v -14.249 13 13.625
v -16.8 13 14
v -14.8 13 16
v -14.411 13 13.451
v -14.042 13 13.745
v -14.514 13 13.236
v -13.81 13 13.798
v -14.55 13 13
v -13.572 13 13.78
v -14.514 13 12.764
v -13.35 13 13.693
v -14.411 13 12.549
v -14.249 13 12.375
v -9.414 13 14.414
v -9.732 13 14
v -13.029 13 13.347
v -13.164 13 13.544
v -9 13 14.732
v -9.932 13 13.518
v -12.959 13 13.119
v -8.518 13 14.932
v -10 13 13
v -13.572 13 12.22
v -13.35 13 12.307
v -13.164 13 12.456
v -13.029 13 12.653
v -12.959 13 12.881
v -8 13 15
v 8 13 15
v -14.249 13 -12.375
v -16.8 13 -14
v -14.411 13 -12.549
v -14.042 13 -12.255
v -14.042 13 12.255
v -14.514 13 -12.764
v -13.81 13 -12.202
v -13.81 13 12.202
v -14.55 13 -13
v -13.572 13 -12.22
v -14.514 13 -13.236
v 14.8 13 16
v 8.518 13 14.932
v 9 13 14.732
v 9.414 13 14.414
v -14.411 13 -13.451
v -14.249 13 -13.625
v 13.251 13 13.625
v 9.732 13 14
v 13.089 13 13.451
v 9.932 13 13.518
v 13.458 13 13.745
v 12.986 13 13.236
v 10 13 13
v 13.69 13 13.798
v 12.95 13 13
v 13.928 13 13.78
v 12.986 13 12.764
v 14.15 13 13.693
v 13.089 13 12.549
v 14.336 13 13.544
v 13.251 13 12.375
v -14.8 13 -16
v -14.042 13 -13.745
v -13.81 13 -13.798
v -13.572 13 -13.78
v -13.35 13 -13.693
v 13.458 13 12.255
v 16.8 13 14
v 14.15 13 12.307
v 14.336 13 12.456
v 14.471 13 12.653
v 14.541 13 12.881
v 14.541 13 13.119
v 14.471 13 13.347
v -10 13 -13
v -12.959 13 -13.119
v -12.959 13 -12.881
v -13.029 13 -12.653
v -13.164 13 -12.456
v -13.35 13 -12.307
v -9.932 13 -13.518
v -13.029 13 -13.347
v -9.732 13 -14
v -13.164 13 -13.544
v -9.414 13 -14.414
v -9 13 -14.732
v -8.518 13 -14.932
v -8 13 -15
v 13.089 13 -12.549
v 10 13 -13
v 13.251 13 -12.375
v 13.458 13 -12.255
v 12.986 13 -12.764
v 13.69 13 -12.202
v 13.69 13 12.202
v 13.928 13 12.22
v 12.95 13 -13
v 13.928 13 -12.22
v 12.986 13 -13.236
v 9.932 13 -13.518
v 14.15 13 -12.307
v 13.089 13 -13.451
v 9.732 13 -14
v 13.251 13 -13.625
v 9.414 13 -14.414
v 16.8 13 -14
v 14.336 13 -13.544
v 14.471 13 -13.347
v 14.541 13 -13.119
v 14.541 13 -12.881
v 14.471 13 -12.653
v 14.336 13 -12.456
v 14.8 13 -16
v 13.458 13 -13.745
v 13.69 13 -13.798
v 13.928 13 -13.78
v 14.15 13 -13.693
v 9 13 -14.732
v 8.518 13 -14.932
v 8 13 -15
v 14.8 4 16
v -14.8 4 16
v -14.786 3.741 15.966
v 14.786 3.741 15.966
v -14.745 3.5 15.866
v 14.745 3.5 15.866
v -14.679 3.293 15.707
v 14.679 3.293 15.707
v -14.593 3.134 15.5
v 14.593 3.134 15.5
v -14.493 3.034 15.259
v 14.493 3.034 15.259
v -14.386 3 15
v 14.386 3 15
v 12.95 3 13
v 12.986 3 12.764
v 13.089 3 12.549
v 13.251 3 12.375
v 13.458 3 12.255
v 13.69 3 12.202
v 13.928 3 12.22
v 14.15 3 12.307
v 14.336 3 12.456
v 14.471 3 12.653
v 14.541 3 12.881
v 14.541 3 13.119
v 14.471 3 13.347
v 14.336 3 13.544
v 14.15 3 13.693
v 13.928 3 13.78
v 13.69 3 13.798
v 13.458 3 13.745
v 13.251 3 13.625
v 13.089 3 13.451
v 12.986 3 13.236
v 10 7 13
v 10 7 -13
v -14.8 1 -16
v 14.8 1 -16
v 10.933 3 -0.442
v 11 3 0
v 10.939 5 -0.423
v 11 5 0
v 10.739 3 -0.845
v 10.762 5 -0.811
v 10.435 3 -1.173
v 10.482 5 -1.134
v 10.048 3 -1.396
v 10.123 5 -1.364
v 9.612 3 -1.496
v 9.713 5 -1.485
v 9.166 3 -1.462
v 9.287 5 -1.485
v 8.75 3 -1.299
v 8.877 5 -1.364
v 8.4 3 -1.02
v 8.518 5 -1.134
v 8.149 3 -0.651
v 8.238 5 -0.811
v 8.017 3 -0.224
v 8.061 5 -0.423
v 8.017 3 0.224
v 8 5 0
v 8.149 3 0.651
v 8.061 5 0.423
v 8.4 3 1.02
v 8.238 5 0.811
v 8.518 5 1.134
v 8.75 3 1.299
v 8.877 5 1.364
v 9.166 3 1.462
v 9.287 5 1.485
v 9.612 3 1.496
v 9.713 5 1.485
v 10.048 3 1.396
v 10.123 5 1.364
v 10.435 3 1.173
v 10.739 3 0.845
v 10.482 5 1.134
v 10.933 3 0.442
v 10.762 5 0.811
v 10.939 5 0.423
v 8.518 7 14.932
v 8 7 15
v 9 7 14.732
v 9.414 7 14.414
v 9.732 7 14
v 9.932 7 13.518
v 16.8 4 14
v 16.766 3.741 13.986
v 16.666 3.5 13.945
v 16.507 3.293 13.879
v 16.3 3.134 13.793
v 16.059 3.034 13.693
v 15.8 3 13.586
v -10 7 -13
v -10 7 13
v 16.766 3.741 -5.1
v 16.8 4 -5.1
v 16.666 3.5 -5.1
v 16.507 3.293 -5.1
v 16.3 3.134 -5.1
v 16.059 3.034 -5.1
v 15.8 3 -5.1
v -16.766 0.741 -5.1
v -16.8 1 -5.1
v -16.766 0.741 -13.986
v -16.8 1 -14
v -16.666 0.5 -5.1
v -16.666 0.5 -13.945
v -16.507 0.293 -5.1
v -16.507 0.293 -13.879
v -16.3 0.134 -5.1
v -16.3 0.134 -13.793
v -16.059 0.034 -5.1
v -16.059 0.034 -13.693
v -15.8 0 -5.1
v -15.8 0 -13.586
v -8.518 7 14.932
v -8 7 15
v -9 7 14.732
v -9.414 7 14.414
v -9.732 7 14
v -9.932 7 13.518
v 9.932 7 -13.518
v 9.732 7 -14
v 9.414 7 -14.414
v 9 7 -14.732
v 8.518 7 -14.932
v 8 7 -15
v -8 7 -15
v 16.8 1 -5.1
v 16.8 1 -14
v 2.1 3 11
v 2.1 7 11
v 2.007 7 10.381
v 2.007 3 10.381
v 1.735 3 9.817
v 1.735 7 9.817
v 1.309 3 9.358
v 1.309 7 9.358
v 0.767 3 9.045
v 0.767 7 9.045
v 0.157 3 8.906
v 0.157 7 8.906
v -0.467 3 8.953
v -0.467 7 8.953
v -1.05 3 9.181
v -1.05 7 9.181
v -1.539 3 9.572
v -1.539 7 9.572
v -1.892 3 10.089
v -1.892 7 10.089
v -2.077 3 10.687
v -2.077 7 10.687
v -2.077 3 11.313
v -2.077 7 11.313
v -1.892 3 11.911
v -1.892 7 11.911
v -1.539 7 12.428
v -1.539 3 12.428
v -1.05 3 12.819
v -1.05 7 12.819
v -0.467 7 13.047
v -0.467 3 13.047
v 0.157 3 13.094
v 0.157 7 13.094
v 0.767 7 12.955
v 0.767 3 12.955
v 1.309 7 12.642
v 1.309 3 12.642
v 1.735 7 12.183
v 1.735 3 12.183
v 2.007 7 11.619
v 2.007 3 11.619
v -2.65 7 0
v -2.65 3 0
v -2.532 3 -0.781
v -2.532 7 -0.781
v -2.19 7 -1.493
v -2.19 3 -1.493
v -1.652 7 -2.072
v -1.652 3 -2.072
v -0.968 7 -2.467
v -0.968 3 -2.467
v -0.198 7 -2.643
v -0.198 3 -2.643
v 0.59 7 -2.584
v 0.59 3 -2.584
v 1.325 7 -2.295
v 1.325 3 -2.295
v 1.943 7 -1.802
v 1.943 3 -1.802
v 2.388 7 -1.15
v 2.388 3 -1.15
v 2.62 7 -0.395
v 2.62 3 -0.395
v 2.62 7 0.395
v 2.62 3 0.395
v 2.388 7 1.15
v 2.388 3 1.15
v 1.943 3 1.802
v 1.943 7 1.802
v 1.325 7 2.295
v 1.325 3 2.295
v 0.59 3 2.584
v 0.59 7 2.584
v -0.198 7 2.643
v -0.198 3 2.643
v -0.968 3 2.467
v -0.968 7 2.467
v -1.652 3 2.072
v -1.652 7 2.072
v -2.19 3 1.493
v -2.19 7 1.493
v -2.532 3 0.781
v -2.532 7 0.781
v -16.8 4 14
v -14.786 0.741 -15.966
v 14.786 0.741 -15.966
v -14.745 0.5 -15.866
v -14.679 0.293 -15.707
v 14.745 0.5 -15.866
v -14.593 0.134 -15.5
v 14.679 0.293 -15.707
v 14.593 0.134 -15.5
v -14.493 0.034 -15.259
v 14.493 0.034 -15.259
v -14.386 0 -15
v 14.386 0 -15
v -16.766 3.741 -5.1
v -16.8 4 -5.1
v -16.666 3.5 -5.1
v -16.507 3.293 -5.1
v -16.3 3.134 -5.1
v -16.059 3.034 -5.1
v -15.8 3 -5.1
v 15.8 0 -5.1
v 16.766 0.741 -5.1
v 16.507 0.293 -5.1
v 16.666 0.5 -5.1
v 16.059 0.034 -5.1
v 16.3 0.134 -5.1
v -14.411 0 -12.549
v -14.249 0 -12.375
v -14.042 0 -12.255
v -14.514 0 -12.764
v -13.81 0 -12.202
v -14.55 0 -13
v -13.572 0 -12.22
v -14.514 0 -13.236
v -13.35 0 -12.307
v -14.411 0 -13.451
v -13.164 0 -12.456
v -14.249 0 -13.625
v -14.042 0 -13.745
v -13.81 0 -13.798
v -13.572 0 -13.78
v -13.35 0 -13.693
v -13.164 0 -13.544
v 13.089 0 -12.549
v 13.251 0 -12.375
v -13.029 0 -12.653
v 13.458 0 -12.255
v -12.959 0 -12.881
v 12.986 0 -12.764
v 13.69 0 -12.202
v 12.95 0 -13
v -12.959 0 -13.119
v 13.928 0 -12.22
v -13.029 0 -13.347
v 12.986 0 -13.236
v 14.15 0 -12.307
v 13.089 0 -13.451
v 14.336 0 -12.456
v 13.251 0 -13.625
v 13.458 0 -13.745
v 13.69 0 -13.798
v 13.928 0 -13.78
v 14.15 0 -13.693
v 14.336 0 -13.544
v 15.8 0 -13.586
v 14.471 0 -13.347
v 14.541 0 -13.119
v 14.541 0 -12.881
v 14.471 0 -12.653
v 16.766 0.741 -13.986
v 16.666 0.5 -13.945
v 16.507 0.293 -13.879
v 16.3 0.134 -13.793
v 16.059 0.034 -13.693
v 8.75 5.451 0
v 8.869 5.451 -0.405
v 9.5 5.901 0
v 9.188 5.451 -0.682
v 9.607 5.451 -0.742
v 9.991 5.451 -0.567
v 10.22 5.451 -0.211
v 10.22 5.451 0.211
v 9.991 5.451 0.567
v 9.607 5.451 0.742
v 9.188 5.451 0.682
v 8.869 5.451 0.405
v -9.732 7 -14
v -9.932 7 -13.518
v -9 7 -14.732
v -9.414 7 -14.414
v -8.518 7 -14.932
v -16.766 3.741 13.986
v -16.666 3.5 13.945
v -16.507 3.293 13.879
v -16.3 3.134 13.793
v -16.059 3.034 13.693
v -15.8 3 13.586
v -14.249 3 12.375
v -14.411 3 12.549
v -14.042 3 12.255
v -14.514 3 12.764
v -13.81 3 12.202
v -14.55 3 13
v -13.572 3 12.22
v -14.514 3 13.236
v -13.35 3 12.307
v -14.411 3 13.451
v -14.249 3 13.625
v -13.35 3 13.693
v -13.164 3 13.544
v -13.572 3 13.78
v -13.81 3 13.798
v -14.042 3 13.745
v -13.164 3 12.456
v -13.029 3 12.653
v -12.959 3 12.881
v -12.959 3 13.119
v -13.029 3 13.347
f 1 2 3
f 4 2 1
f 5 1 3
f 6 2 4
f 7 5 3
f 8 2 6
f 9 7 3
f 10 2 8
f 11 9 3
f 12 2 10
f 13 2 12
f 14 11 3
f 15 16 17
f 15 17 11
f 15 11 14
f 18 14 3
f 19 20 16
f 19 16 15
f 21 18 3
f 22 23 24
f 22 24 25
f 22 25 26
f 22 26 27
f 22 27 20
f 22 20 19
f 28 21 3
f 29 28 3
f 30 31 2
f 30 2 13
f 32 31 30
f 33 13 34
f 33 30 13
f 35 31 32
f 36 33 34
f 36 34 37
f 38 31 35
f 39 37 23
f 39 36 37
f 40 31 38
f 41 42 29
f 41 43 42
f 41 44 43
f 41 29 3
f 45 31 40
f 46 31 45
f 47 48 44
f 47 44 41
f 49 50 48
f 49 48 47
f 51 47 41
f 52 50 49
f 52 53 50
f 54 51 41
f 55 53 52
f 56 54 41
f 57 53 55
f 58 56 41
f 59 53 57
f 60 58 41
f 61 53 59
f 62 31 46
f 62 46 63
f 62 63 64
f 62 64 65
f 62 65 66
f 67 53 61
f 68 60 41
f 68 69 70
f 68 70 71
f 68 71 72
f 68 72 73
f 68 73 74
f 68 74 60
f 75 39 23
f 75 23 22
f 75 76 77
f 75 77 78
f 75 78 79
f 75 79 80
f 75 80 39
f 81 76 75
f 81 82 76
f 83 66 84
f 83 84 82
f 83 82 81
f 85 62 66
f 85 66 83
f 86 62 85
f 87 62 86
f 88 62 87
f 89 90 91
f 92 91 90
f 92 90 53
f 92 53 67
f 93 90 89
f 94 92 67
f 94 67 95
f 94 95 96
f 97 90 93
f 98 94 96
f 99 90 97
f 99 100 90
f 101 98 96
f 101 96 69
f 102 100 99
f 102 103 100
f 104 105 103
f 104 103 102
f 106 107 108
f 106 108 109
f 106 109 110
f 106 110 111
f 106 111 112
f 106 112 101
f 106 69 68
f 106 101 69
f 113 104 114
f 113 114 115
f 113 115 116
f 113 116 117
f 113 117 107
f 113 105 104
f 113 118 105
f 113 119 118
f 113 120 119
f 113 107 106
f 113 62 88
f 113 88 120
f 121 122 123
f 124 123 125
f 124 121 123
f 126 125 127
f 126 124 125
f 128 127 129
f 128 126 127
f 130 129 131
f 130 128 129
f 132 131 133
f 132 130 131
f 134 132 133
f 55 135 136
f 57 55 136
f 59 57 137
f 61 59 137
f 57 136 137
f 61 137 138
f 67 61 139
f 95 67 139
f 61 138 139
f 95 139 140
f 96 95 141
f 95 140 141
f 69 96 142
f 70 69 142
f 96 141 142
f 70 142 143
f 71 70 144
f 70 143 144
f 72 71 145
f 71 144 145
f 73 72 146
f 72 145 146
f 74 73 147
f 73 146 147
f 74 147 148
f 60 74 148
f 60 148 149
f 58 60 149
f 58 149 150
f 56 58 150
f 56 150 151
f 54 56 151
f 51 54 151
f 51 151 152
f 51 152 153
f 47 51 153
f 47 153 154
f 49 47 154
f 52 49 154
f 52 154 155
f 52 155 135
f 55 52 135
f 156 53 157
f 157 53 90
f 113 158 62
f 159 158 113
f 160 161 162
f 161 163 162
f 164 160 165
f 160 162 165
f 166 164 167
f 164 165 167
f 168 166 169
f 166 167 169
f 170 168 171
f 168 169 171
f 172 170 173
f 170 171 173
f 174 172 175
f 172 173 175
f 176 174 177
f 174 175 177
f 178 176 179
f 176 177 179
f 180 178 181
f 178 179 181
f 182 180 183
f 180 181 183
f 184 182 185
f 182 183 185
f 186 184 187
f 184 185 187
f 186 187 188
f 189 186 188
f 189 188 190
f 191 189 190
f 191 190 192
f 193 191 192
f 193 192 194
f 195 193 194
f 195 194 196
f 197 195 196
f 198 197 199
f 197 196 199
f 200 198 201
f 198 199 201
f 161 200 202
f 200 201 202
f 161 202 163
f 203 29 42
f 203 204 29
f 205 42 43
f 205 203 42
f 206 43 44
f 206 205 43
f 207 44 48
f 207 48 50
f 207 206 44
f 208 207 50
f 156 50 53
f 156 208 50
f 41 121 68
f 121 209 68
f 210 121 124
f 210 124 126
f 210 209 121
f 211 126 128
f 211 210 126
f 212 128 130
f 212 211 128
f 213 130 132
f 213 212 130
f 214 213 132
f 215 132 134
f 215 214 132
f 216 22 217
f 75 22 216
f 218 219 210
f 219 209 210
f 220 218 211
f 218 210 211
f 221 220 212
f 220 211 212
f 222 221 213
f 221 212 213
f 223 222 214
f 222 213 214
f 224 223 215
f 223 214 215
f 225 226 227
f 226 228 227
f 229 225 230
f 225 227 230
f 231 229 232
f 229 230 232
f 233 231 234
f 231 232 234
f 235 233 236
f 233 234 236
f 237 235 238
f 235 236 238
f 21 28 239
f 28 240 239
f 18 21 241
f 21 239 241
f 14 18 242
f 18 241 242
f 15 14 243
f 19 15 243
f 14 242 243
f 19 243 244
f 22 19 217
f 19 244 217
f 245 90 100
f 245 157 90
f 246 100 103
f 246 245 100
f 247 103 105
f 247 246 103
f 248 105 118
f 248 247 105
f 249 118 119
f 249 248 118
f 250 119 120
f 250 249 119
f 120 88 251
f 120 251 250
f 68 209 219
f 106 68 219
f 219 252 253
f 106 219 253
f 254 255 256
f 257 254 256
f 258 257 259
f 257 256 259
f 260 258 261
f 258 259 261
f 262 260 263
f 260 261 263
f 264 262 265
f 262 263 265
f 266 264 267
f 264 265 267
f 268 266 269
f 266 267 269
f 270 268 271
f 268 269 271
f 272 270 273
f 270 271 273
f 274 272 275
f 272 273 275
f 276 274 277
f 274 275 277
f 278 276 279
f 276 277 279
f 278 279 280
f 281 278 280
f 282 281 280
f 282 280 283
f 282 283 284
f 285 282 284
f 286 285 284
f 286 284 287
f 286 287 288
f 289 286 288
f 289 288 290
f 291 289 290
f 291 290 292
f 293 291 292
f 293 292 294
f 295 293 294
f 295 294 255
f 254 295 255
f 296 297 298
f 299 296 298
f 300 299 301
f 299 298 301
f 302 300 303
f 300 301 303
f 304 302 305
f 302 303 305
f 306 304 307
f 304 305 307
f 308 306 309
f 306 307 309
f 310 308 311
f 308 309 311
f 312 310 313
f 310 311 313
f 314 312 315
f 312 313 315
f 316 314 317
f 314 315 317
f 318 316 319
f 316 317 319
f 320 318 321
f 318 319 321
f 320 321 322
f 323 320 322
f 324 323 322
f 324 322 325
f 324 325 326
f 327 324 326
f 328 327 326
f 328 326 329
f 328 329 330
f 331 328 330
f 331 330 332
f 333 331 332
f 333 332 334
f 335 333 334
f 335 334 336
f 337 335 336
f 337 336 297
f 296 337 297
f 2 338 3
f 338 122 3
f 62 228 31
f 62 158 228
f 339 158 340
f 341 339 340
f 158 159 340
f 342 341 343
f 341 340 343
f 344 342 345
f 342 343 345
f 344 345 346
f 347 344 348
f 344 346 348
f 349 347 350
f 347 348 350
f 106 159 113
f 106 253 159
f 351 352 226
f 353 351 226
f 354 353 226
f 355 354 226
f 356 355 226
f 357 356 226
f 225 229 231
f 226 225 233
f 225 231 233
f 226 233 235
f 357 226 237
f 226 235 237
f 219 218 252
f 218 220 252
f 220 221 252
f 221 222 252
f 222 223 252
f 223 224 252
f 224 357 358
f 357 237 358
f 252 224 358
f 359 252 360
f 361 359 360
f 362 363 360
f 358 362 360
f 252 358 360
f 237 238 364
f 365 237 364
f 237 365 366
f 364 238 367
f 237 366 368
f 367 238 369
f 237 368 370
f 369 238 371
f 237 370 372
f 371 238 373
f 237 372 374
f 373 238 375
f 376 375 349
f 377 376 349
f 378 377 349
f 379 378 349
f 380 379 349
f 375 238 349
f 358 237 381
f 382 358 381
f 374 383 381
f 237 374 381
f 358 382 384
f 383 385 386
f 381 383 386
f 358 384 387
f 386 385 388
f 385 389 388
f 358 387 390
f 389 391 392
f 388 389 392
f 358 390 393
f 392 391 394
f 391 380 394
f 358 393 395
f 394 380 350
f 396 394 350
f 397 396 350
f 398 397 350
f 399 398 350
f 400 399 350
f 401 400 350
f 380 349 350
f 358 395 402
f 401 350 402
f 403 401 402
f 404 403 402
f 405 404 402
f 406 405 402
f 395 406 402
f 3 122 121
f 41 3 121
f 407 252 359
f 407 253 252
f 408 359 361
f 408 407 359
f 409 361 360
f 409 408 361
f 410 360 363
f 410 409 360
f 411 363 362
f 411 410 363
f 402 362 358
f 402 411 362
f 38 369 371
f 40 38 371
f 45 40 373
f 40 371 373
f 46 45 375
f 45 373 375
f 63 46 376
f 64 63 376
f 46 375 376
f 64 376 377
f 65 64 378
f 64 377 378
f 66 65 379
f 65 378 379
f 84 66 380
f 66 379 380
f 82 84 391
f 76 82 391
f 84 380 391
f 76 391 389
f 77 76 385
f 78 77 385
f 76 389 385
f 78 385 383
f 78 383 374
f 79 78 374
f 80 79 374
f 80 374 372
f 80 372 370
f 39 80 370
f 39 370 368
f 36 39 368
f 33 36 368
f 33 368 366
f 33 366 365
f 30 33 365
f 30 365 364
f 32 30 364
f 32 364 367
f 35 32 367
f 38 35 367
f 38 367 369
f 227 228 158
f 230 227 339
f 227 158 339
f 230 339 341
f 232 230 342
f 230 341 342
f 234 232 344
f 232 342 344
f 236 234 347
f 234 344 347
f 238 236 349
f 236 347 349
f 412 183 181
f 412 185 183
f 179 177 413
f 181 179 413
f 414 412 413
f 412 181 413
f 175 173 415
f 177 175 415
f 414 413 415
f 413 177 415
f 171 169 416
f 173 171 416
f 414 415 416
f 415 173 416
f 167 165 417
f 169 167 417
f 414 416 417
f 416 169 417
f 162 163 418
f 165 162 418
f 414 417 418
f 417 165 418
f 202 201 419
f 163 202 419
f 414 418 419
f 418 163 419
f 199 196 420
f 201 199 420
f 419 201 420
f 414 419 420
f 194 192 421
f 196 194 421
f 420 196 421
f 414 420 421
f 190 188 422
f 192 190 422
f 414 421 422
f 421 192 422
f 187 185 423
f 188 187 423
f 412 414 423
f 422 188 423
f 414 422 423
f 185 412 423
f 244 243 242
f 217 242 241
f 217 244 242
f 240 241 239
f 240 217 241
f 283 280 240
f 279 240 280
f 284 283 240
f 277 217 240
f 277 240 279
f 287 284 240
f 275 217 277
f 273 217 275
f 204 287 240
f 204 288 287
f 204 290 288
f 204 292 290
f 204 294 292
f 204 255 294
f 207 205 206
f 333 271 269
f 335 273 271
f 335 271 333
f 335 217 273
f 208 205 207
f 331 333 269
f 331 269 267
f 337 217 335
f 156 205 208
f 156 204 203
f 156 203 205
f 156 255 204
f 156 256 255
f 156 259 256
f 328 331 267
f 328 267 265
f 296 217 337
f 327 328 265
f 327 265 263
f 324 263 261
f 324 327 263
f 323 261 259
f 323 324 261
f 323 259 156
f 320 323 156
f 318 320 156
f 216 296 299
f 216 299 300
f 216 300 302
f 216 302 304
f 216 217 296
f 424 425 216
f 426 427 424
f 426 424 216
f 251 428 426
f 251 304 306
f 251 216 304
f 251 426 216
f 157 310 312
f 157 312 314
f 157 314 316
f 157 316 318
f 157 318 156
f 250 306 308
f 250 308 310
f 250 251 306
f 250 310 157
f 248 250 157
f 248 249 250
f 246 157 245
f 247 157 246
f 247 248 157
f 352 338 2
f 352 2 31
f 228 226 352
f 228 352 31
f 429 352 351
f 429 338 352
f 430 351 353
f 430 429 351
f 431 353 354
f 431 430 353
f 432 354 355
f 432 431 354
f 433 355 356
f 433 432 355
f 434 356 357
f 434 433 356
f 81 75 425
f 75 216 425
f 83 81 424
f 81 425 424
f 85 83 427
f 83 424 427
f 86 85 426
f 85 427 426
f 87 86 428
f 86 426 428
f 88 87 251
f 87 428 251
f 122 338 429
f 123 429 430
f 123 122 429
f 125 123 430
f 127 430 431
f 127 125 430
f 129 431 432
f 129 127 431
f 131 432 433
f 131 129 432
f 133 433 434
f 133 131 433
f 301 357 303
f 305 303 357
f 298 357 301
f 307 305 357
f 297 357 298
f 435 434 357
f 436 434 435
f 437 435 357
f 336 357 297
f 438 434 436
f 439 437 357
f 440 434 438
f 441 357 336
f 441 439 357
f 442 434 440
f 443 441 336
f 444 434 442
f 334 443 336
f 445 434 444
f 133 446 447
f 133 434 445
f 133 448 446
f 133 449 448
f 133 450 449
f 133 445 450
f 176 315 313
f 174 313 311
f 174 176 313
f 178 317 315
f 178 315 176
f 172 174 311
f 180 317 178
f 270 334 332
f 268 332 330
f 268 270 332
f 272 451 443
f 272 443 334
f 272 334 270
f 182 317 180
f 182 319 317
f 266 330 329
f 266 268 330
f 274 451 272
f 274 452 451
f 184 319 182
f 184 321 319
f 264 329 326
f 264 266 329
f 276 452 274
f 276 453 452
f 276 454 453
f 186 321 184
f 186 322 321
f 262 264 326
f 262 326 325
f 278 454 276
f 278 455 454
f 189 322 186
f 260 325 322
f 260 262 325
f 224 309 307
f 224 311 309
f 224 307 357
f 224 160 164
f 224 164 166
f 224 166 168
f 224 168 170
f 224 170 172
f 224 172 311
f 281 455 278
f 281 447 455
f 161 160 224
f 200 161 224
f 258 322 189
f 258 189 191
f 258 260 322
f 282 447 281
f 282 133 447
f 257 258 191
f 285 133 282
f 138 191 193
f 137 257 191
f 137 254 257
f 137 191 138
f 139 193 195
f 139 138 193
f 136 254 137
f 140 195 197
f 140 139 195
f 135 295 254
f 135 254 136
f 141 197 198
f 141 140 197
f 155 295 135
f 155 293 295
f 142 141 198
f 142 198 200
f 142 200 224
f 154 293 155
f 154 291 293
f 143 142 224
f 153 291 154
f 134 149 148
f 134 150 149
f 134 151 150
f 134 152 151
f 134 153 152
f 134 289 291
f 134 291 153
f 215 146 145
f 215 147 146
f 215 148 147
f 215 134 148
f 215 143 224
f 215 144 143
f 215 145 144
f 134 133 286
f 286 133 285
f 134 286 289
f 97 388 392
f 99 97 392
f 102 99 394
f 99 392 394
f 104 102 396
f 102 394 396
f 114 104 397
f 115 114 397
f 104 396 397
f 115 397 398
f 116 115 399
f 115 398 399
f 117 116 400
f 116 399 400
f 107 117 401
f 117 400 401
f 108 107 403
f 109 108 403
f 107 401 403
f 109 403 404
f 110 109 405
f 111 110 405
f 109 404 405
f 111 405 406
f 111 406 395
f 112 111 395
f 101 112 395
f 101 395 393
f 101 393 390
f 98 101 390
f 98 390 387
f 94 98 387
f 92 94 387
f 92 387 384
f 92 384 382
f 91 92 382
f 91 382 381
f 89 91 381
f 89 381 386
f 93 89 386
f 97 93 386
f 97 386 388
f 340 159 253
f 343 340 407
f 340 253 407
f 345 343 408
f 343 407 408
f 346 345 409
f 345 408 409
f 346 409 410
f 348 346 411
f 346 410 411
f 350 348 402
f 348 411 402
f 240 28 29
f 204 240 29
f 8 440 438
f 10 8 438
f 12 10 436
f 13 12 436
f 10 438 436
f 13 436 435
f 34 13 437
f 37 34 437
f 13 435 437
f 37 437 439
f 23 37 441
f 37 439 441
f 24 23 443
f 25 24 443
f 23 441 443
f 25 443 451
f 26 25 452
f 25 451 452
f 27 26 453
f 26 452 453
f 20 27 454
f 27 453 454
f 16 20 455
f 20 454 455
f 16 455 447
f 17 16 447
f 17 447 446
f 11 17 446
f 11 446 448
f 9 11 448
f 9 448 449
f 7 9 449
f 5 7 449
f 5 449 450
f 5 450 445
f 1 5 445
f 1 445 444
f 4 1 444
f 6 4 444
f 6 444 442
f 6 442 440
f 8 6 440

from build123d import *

# Parameters (mm, degrees)
SKIZZE1_W                          = 33.6
SKIZZE1_H                          = 32
AUFSATZ_LINEAR_AUSTRAGEN1_DEPTH    = 13
SKIZZE17_W                         = 20
SKIZZE17_H                         = 30
SCHNITT_LINEAR_AUSTRAGEN2_DEPTH    = 6
KERNLOCH_F_R_M2_GEWINDE1_D         = 1.6
VERRUNDUNG2_R                      = 2
DURCHGANGSLOCH_F_R_M52_D           = 5.3
F_3_0MM_CLEARANCE_STIFTLOCH1_D     = 3
F_3_0MM_CLEARANCE_STIFTLOCH1_DEPTH = 5
F_3_0MM_CLEARANCE_STIFTLOCH1_TIP   = 0.901290929
KERNLOCH_F_R_M5_GEWINDE1_D         = 4.2
SKIZZE27_W                         = 33.6
SKIZZE27_H                         = 21.1
SCHNITT_LINEAR_AUSTRAGEN3_DEPTH    = 3
FASE1_SIZE                         = 2
VERRUNDUNG3_R                      = 1


with BuildPart() as part:
    # Skizze1 → Aufsatz-Linear austragen1 (new body)
    with BuildSketch(Plane(origin=(0, 0, 0), x_dir=(1, 0, 0), z_dir=(0, 1, 0))):
        Rectangle(SKIZZE1_W, SKIZZE1_H)
    extrude(amount=AUFSATZ_LINEAR_AUSTRAGEN1_DEPTH)

    # Skizze17 → Schnitt-Linear austragen2 (cut)
    with BuildSketch(Plane(origin=(0, 13, 0), x_dir=(1, 0, 0), z_dir=(0, 1, 0))):
        Rectangle(SKIZZE17_W, SKIZZE17_H)
    extrude(amount=-SCHNITT_LINEAR_AUSTRAGEN2_DEPTH, mode=Mode.SUBTRACT)

    # Kernloch für M2 Gewinde1 (through all)
    with Locations(Plane(origin=(0, 13, 0), x_dir=(1, 0, 0), z_dir=(0, 1, 0))):
        with Locations((-13.75, 13), (13.75, 13), (13.75, -13), (-13.75, -13)):
            Hole(KERNLOCH_F_R_M2_GEWINDE1_D / 2)

    # Verrundung2
    verrundung2_edges = [part.edges().sort_by_distance(p)[0] for p in [
        (-10, 10, 15),
        (-10, 10, -15),
        (10, 10, -15),
        (10, 10, 15),
    ]]
    fillet(verrundung2_edges, radius=VERRUNDUNG2_R)

    # Durchgangsloch für M52 (through all)
    with Locations(Plane(origin=(0, 7, 0), x_dir=(1, 0, 0), z_dir=(0, 1, 0))):
        with Locations((0, 0)):
            Hole(DURCHGANGSLOCH_F_R_M52_D / 2)

    # Ø3.0mm Clearance Stiftloch1
    with Locations(Plane(origin=(0, 0, 0), x_dir=(-1, 0, 0), z_dir=(0, -1, 0))):
        with Locations((-9.5, 0)):
            Hole(F_3_0MM_CLEARANCE_STIFTLOCH1_D / 2, depth=F_3_0MM_CLEARANCE_STIFTLOCH1_DEPTH)
            with Locations((0, 0, -(F_3_0MM_CLEARANCE_STIFTLOCH1_DEPTH + F_3_0MM_CLEARANCE_STIFTLOCH1_TIP / 2))):  # 118° drill point
                Cone(0, F_3_0MM_CLEARANCE_STIFTLOCH1_D / 2, F_3_0MM_CLEARANCE_STIFTLOCH1_TIP, mode=Mode.SUBTRACT)

    # Kernloch für M5 Gewinde1 (through all)
    with Locations(Plane(origin=(0, 0, 0), x_dir=(-1, 0, 0), z_dir=(0, -1, 0))):
        with Locations((0, -11)):
            Hole(KERNLOCH_F_R_M5_GEWINDE1_D / 2)

    # Skizze27 → Schnitt-Linear austragen3 (cut)
    with BuildSketch(Plane.XZ):
        with Locations((0, 5.45)):
            Rectangle(SKIZZE27_W, SKIZZE27_H)
    extrude(amount=-SCHNITT_LINEAR_AUSTRAGEN3_DEPTH, mode=Mode.SUBTRACT)

    # Fase1
    fase1_edges = [part.edges().sort_by_distance(p)[0] for p in [
        (-16.8, 6.5, -16),
        (16.8, 6.5, -16),
        (16.8, 8, 16),
        (-16.8, 8, 16),
    ]]
    chamfer(fase1_edges, length=FASE1_SIZE)

    # Verrundung3
    verrundung3_edges = [part.edges().sort_by_distance(p)[0] for p in [
        (0, 3, 16),
        (-16.8, 3, 4.45),
        (15.8, 3, 15),
        (-15.8, 3, 15),
        (-16.8, 0, -9.55),
        (0, 0, -16),
        (-15.8, 0, -15),
        (15.8, 0, -15),
        (16.8, 0, -9.55),
        (16.8, 3, 4.45),
    ]]
    fillet(verrundung3_edges, radius=VERRUNDUNG3_R)


solid = part.part
